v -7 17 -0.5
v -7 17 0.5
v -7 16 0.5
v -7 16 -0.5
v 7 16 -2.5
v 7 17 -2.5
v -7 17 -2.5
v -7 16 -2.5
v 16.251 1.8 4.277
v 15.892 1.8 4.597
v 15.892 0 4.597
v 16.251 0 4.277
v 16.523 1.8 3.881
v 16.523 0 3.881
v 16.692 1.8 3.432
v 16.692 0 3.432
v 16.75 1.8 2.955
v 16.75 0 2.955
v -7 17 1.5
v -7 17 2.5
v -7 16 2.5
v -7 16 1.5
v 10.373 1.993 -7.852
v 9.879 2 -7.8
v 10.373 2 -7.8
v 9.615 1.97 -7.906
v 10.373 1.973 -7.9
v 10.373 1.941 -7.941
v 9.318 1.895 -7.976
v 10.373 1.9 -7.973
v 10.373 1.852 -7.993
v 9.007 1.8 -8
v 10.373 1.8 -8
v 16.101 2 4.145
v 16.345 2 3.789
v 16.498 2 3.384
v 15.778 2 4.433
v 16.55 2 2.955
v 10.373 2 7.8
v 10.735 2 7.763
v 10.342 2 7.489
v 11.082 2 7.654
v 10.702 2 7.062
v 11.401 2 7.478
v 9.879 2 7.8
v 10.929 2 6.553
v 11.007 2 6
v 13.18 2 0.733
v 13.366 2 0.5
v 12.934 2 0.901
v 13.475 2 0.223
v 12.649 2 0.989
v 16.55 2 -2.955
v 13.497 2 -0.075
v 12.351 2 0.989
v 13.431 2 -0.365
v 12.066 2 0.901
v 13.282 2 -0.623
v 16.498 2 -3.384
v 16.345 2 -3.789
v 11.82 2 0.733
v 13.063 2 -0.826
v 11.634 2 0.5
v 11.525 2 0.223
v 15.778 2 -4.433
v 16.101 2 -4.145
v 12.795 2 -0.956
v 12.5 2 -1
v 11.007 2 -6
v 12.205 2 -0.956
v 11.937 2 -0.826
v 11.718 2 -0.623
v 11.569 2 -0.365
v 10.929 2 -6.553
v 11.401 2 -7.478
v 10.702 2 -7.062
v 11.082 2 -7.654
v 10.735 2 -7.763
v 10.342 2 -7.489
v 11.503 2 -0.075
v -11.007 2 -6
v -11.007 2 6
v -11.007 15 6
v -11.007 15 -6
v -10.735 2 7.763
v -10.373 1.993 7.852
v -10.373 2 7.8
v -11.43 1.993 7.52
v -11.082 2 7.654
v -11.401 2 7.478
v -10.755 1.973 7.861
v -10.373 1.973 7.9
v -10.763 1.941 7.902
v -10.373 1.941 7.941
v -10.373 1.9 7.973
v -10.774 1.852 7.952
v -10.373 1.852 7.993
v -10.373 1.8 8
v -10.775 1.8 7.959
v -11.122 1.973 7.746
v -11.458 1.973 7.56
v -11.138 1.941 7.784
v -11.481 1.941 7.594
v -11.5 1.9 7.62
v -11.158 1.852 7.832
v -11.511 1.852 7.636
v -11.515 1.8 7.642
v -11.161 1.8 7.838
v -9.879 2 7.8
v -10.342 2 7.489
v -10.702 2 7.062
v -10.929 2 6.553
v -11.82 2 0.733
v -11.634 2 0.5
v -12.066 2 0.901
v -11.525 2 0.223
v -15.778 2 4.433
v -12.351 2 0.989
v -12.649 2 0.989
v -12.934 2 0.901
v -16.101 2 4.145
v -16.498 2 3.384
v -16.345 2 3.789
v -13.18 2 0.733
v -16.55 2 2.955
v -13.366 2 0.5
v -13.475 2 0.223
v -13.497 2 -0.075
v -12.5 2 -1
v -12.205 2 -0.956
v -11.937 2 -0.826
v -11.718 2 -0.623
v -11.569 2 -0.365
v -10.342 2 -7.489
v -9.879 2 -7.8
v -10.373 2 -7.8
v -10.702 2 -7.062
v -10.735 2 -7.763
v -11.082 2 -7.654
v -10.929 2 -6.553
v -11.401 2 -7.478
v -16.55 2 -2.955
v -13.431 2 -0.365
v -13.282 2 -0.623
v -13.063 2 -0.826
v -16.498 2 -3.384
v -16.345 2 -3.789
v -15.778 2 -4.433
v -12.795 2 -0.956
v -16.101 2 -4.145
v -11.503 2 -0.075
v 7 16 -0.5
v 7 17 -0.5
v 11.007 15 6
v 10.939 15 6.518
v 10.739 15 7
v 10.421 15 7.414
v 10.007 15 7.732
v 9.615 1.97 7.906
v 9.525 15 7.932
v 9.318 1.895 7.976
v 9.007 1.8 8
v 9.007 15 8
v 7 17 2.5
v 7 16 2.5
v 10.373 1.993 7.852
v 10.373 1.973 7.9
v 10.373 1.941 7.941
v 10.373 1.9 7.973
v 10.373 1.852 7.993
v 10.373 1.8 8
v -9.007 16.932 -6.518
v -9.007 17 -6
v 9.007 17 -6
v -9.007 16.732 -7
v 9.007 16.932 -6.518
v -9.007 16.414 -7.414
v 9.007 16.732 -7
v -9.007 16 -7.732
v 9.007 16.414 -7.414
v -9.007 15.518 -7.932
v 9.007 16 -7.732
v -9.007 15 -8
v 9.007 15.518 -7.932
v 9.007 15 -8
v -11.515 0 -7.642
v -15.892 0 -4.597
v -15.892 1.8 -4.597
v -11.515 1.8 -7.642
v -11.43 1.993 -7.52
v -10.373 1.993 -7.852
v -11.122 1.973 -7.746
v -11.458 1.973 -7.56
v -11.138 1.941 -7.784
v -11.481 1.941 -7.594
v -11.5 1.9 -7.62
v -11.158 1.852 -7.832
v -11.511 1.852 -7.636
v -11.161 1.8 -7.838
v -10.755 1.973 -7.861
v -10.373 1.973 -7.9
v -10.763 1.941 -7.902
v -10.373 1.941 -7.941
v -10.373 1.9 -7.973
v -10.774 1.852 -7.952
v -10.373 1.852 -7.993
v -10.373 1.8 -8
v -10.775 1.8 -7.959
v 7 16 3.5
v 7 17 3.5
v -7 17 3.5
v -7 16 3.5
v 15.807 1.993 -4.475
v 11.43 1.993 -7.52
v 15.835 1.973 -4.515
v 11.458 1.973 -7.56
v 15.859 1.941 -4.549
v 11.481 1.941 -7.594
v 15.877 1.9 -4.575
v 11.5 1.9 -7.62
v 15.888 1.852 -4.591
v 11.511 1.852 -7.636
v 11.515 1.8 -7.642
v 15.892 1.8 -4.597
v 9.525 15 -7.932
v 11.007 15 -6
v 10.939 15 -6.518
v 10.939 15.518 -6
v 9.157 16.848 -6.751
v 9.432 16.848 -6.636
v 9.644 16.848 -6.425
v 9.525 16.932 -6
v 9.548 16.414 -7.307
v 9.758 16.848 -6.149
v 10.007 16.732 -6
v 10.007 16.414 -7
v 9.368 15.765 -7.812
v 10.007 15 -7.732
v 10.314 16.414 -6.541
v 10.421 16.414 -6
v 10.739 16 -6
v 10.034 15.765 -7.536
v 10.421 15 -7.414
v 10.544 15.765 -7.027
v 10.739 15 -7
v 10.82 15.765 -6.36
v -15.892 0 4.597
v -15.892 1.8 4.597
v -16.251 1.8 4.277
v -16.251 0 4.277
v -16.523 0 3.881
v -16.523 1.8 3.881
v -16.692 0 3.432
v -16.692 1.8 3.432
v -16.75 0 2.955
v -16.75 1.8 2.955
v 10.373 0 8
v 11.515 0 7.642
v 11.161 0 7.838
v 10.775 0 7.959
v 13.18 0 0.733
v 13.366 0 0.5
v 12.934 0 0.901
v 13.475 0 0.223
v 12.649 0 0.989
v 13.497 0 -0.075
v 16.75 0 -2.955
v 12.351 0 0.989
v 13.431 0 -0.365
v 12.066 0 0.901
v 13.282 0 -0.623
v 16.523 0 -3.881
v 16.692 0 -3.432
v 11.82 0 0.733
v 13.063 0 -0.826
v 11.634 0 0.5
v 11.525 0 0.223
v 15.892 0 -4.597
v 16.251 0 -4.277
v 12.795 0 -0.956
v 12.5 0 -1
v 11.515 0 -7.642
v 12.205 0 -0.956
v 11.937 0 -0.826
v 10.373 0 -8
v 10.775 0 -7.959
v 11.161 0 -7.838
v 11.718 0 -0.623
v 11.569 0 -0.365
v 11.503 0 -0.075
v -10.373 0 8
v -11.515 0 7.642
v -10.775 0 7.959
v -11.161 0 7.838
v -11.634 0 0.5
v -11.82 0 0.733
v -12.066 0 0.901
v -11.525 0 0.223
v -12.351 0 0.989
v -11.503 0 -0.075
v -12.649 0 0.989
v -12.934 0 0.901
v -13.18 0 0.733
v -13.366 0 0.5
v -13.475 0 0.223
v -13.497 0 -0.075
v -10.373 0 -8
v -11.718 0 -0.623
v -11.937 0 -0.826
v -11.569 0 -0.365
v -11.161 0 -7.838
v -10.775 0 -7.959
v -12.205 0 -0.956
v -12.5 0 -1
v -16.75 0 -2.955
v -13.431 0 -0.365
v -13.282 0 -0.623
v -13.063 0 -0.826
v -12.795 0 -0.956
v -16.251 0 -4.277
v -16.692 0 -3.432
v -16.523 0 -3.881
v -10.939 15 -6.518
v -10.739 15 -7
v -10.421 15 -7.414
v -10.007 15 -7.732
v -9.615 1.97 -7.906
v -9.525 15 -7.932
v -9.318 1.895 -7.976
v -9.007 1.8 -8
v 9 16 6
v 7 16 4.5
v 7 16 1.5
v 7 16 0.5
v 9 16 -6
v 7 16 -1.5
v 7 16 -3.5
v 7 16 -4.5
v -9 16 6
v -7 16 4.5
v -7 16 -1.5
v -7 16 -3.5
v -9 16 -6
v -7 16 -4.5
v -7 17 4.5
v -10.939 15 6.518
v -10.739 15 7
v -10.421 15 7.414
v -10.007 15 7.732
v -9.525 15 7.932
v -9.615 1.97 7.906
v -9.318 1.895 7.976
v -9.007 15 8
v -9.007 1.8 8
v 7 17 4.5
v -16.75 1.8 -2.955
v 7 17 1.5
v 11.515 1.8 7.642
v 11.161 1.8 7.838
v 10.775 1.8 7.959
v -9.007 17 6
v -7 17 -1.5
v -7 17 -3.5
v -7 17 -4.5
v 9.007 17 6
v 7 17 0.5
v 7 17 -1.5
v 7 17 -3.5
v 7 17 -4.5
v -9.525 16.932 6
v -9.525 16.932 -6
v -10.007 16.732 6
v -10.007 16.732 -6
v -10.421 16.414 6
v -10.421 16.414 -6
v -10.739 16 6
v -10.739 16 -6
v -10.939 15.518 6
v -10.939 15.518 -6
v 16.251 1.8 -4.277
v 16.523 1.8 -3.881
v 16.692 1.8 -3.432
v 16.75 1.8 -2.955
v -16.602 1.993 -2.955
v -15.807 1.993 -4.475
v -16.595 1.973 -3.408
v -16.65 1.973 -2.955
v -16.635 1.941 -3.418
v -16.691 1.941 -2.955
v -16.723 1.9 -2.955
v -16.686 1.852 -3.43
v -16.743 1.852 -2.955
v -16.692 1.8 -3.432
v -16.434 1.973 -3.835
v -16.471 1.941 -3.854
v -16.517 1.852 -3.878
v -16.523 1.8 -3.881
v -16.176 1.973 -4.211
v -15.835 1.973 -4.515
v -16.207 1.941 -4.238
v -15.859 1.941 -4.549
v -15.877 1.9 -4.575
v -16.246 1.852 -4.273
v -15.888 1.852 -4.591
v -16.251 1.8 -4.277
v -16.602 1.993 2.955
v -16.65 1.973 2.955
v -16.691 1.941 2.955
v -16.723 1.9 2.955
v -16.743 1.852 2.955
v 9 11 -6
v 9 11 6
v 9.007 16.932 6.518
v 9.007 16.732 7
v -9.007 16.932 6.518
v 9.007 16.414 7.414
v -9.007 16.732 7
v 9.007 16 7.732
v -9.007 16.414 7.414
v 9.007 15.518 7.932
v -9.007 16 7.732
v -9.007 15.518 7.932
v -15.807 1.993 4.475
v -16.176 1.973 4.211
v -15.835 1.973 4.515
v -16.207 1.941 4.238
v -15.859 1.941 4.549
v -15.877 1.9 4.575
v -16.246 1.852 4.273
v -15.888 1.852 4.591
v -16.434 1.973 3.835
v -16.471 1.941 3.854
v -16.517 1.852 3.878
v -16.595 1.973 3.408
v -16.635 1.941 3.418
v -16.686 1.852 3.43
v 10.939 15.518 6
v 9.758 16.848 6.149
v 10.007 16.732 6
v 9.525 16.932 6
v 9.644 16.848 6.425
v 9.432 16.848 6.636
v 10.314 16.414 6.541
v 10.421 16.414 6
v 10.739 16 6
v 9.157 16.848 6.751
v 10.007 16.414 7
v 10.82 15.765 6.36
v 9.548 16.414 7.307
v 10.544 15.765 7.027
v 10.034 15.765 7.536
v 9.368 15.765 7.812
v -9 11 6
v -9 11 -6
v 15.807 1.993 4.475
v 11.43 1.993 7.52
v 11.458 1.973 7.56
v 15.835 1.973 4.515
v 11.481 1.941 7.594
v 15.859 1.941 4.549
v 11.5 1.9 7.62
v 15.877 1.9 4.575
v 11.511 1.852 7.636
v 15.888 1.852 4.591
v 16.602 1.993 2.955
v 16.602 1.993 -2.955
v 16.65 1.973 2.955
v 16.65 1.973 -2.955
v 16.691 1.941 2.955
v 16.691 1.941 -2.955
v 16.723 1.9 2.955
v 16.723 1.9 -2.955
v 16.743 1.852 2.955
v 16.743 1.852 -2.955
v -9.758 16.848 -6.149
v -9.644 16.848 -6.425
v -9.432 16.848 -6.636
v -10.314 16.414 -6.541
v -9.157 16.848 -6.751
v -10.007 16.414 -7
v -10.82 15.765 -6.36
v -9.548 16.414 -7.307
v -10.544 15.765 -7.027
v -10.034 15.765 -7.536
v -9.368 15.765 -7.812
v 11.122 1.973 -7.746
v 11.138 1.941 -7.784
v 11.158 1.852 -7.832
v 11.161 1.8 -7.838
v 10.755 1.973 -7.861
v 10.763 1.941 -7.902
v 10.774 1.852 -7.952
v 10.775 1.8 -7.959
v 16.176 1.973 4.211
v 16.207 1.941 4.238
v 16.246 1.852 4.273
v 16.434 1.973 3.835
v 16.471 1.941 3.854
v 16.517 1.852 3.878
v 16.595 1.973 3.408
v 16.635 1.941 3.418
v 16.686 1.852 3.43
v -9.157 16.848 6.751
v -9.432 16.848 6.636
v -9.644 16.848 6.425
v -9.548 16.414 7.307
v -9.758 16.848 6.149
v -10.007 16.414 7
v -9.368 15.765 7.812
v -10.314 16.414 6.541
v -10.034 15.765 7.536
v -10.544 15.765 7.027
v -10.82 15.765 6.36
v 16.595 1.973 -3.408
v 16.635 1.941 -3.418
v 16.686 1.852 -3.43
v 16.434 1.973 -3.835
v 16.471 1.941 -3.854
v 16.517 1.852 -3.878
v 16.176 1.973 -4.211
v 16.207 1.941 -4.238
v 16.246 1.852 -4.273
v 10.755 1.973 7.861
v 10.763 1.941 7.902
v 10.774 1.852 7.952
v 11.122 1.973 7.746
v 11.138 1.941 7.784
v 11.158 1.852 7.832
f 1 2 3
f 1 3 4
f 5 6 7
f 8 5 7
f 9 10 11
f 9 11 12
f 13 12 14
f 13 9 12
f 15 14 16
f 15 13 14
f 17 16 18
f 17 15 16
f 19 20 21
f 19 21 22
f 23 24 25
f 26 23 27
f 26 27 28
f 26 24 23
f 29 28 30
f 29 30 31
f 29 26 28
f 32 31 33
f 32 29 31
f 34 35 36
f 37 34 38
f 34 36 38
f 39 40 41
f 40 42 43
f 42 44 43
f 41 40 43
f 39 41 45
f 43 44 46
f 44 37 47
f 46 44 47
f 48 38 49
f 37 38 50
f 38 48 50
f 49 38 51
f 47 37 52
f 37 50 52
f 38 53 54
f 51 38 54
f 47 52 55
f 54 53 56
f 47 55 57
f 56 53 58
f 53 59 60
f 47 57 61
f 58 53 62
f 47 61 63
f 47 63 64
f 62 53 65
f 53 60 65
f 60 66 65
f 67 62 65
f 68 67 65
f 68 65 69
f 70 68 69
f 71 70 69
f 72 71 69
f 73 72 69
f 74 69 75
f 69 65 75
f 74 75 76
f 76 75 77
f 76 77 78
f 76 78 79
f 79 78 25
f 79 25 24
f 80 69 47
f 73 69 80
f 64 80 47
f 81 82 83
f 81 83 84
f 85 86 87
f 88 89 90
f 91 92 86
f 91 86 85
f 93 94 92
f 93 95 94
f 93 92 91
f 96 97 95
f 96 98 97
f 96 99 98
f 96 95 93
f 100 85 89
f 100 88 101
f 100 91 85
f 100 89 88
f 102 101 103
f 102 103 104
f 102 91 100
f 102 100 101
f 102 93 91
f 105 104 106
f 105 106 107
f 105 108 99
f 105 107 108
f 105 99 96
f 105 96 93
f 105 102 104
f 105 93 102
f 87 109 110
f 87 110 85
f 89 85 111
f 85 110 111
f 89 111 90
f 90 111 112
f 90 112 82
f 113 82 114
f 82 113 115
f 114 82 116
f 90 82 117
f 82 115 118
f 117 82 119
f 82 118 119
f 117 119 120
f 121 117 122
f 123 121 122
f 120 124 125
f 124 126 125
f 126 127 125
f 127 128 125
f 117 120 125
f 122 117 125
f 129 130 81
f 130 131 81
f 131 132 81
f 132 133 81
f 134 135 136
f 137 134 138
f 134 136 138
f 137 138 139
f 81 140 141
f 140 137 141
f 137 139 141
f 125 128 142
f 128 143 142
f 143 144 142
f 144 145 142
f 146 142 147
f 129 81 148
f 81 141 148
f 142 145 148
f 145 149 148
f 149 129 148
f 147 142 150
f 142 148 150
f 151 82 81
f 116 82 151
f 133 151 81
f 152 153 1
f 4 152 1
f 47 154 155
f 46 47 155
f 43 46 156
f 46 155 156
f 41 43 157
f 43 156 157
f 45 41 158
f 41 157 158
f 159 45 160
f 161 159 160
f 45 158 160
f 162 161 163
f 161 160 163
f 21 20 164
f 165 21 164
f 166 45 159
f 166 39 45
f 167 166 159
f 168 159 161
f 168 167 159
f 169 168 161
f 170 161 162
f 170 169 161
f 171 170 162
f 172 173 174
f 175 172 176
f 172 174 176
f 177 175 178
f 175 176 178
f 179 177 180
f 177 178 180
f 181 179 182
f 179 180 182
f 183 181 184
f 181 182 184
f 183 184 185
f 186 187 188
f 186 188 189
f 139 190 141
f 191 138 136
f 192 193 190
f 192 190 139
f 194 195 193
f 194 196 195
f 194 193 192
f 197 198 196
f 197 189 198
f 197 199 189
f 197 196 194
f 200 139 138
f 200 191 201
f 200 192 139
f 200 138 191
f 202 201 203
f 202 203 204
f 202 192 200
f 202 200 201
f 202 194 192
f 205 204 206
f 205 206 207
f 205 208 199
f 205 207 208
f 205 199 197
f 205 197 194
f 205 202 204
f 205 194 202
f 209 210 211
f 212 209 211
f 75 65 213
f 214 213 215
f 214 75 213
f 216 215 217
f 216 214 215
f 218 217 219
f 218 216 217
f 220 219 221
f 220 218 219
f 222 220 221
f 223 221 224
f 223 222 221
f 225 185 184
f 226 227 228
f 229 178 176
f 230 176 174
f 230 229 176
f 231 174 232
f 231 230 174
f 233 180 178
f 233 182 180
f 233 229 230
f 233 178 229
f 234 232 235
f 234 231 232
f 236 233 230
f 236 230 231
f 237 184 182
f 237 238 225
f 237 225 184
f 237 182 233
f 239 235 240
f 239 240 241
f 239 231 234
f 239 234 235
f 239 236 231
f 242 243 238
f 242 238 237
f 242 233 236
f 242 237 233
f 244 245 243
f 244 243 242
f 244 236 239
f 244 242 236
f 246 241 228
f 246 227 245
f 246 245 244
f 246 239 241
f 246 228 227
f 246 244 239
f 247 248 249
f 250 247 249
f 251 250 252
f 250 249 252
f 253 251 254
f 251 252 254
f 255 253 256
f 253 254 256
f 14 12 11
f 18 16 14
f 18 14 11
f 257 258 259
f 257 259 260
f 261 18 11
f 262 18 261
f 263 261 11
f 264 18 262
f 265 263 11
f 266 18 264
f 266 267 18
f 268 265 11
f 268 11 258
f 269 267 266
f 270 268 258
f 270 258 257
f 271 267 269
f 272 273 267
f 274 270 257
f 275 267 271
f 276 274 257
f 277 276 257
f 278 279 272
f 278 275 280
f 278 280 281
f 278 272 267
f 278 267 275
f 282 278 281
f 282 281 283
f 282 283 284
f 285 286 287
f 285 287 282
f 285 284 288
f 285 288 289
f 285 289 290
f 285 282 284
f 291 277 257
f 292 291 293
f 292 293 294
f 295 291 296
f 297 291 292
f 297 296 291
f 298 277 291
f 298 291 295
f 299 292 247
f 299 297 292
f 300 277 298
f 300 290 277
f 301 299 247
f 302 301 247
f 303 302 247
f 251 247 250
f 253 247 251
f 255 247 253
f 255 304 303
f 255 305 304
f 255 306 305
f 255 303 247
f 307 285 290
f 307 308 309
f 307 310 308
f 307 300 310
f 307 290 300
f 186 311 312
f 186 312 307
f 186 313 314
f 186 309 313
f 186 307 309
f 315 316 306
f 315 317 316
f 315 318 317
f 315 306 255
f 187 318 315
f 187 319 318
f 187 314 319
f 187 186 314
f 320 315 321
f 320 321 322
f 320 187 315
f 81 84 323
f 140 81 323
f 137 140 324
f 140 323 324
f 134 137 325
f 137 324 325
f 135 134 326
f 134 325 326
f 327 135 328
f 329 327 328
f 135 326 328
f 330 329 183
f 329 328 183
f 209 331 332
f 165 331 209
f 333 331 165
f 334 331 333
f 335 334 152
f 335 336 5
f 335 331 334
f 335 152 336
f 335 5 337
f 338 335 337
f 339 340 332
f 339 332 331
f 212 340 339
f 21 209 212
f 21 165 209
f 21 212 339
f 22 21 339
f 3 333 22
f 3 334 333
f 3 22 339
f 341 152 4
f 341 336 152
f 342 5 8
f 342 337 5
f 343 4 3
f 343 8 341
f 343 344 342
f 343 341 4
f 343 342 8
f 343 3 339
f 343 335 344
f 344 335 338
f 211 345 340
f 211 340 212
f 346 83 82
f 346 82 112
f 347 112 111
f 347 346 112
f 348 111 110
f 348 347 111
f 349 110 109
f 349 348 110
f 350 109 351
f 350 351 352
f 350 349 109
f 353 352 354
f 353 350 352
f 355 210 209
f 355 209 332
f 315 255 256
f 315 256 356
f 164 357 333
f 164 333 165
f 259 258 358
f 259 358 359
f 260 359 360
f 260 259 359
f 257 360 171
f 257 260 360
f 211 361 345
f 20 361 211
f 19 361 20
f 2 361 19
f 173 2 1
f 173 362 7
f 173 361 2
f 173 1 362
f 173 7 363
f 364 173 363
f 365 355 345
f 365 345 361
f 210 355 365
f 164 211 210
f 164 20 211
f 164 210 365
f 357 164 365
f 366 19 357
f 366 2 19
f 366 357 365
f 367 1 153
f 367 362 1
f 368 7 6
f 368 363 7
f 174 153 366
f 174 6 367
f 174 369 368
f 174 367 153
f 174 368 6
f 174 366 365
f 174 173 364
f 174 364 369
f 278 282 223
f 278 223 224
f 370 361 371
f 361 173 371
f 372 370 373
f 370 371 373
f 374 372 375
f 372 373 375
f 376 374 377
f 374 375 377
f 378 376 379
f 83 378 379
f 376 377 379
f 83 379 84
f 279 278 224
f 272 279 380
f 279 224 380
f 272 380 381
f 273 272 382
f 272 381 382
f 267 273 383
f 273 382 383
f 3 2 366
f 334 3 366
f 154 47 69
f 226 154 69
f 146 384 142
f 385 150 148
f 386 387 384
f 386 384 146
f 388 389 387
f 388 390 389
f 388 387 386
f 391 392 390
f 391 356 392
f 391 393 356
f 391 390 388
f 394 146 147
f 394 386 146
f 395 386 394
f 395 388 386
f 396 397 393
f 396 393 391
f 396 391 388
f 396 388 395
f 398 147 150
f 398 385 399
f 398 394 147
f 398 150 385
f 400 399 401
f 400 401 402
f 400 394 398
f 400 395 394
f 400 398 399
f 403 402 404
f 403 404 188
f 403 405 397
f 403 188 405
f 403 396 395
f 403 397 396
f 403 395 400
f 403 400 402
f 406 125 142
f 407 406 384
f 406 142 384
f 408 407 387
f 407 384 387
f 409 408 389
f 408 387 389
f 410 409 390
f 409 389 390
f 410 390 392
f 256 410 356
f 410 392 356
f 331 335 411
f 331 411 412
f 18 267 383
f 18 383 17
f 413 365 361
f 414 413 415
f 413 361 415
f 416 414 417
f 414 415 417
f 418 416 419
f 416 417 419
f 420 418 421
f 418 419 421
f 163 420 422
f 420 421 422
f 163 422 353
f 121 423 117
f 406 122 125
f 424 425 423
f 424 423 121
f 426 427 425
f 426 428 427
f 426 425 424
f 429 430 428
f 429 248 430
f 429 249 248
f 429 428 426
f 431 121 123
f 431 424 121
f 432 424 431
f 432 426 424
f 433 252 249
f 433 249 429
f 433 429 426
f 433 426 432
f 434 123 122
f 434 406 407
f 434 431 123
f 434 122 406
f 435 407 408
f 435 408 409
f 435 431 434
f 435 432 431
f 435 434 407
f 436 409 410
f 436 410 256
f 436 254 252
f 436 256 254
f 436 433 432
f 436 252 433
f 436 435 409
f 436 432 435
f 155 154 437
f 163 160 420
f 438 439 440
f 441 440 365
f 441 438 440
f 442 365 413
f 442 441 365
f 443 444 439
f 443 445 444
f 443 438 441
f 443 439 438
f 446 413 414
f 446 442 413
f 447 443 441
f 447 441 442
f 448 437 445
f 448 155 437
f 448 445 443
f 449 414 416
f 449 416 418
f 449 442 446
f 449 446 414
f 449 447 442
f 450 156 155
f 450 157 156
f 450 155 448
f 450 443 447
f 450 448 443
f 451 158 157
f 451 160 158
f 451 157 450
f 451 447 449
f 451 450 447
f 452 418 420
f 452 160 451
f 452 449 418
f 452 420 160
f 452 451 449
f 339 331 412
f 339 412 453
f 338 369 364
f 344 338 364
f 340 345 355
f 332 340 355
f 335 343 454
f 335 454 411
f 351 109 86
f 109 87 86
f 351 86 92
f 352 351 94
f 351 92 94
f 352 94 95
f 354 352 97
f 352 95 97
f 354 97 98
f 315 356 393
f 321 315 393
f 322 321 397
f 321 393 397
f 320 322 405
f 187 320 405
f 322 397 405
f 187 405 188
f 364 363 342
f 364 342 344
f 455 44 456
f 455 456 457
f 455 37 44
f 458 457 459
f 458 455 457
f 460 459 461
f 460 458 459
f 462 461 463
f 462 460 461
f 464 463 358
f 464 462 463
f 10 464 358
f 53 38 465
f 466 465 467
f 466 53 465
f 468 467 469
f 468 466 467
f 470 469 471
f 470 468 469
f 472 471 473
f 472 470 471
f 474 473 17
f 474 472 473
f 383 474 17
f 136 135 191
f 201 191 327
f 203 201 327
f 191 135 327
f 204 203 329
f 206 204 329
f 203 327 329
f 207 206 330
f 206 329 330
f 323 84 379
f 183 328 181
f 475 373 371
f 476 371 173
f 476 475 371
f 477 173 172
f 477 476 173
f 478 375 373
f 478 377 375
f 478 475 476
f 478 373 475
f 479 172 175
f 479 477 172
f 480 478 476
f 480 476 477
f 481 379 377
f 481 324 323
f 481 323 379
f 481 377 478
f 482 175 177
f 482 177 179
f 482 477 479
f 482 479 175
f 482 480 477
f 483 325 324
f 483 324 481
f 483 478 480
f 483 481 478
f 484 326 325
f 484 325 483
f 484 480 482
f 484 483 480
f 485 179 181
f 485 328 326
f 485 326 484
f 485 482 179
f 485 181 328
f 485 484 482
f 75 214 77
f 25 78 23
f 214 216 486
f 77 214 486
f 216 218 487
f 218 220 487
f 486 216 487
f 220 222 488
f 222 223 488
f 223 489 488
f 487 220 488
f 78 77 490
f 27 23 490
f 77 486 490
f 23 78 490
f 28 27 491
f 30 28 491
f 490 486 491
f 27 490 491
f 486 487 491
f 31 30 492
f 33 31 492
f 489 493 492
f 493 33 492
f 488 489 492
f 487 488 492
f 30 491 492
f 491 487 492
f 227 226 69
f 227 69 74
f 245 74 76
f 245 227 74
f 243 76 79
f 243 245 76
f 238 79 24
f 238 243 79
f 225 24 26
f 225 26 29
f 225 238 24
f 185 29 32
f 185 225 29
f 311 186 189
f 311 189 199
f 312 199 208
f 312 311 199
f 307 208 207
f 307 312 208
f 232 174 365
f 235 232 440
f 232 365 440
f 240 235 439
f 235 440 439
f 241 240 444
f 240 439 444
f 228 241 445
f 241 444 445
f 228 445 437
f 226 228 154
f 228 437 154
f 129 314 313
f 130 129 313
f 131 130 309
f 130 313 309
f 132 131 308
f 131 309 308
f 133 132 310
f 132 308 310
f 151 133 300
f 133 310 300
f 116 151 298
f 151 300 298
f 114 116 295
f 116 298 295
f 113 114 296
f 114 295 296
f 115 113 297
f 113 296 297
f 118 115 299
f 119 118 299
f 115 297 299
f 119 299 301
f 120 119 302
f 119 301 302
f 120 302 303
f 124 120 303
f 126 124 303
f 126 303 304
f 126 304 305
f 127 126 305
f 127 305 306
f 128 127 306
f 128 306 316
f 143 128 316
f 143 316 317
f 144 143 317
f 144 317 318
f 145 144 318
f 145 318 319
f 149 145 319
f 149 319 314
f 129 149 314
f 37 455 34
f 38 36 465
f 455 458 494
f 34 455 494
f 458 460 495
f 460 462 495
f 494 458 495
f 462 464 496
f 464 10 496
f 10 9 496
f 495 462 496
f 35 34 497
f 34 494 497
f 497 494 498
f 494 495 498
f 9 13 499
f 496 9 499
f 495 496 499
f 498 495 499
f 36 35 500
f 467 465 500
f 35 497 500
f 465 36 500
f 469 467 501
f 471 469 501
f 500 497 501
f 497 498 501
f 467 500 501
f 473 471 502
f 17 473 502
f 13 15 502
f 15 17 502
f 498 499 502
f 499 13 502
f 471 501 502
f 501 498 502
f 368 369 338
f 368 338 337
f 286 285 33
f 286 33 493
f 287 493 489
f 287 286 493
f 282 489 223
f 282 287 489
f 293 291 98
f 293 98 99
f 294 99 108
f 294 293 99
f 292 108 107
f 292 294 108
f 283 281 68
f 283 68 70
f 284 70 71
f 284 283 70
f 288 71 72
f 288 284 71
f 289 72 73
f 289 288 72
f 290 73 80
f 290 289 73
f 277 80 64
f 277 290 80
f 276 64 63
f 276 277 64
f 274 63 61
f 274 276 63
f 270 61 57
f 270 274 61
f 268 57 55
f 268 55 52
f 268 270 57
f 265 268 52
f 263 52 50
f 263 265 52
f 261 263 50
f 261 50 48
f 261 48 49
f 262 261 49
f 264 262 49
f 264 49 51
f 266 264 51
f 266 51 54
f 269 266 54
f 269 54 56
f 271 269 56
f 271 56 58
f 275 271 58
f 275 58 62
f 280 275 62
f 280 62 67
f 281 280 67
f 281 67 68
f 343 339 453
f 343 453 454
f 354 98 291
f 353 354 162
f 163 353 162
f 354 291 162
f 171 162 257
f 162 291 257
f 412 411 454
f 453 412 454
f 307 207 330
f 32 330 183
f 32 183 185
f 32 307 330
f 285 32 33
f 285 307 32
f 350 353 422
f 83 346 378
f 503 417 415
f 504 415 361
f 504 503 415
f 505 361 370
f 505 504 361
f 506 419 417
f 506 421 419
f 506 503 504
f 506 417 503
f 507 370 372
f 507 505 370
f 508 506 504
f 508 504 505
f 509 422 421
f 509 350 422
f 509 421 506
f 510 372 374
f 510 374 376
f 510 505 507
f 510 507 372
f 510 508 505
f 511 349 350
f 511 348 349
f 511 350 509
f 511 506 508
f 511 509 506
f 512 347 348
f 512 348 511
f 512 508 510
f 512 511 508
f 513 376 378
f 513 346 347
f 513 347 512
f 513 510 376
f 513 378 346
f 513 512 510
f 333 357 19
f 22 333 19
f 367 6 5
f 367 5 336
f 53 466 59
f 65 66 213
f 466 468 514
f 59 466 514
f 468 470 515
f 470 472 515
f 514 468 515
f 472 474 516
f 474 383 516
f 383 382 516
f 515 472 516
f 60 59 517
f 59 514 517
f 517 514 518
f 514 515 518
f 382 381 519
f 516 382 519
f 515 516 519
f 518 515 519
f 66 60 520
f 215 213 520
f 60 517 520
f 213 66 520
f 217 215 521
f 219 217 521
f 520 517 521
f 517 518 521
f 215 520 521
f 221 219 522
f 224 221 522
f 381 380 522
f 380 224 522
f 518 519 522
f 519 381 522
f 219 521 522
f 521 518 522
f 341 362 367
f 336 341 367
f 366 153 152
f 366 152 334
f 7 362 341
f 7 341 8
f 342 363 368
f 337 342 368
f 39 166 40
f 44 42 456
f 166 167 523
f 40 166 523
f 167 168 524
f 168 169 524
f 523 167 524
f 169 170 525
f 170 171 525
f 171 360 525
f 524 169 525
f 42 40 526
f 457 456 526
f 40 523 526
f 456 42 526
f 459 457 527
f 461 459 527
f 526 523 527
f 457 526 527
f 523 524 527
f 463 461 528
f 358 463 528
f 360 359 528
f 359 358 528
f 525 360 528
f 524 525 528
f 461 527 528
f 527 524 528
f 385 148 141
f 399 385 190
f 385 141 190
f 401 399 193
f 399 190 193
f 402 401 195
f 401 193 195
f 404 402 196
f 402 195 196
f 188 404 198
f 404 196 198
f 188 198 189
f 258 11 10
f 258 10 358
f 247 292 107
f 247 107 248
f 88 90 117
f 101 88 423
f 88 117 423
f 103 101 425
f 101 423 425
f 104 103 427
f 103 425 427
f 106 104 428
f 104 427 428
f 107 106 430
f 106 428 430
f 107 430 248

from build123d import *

# Parameters (mm, degrees)
EXTRUDE_1_DEPTH            = 2
SKETCH_2_W                 = 22.014506199136
SKETCH_2_H                 = 16
EXTRUDE_2_DEPTH            = 15
CUT_EXTRUDE_1_REACH        = 27.171
SKETCH_3_R                 = 1.0000000000000016
CUT_EXTRUDE_2_DEPTH        = 1
PATTERN_LINEAR_1_COUNT     = 3
PATTERN_LINEAR_1_PITCH     = 2
PATTERN_LINEAR_1_COL_COUNT = 3
PATTERN_LINEAR_1_COL_PITCH = 2
CUT_EXTRUDE_3_DEPTH        = 5
FILLET_4_R                 = 2
CUT_EXTRUDE_5_DEPTH        = 15
MIRROR_3_COPY_1_DEPTH      = 15
FILLET_6_R                 = 0.2
FILLET_7_R                 = 2


with BuildPart() as part:
    # 草图1 → 凸台-拉伸1 (new body)
    with BuildSketch(Plane(origin=(0, 0, 0), x_dir=(1, 0, 0), z_dir=(0, 1, 0))):
        with BuildLine():
            Line((-16.75, -4.000000000000002), (-16.75, 3.9999999999999982))
            Line((-16.75, 3.9999999999999982), (-11.51489754486675, 7.641810403570972))
            ThreePointArc((-11.51489754486675, 7.641810403570972), (-10.971257997306036, 7.908352798507383), (-10.372768568469548, 7.9999999999999964))
            Line((-10.372768568469548, 7.9999999999999964), (10.372768568469544, 8))
            ThreePointArc((10.372768568469544, 8), (10.971257997306031, 7.908352798507387), (11.514897544866734, 7.641810403570965))
            Line((11.514897544866734, 7.641810403570965), (16.75, 4.000000000000005))
            Line((16.75, 4.000000000000005), (16.75, -3.9999999999999947))
            Line((16.75, -3.9999999999999947), (11.514897544866738, -7.641810403570964))
            ThreePointArc((11.514897544866738, -7.641810403570964), (10.971257997306049, -7.908352798507378), (10.37276856846958, -7.9999999999999964))
            Line((10.37276856846958, -7.9999999999999964), (-10.372768568469548, -7.999999999999998))
            ThreePointArc((-10.372768568469548, -7.999999999999998), (-10.971257997306035, -7.908352798507385), (-11.51489754486674, -7.641810403570962))
            Line((-11.51489754486674, -7.641810403570962), (-16.75, -4.000000000000002))
        make_face()
    extrude(amount=EXTRUDE_1_DEPTH)

    # 草图2 → 凸台-拉伸2 (add)
    with BuildSketch(Plane(origin=(0, 2, 0), x_dir=(1, 0, 0), z_dir=(0, 1, 0))):
        Rectangle(SKETCH_2_W, SKETCH_2_H)
    extrude(amount=EXTRUDE_2_DEPTH)

    # 草图3 → 切除-拉伸1 (cut, up to next)
    with BuildSketch(Plane.XZ, mode=Mode.PRIVATE) as cut_extrude_1_sk1:
        with Locations(Location((-12.5, -1.53e-15, 0), (0, 0, 270))):
            Circle(SKETCH_3_R)
    cut_extrude_1_tool1 = extrude(cut_extrude_1_sk1.sketch, amount=-CUT_EXTRUDE_1_REACH, mode=Mode.PRIVATE) & part.part
    cut_extrude_1 = cut_extrude_1_tool1.solids().sort_by_distance((-12.5, 0, 0))[0]
    add(cut_extrude_1, mode=Mode.SUBTRACT)

    # 镜向1: 切除-拉伸1 across plane
    add(cut_extrude_1.mirror(Plane(origin=(0, 0, 0), x_dir=(0, 0, 1), z_dir=(1, 0, 0))), mode=Mode.SUBTRACT)

    # 草图4 → 切除-拉伸2 (cut)
    with BuildSketch(Plane(origin=(0, 17, 0), x_dir=(1, 0, 0), z_dir=(0, 1, 0))):
        Polygon((0, 0.5), (7, 0.5), (7, -0.5), (0, -0.5), (-7, -0.5), (-7, 0.5), align=None)
    cut_extrude_2 = extrude(amount=-CUT_EXTRUDE_2_DEPTH, mode=Mode.SUBTRACT)

    # 阵列(线性)1: 切除-拉伸2 ×3
    with Locations(*[(0, 0, i * PATTERN_LINEAR_1_PITCH) for i in range(1, PATTERN_LINEAR_1_COUNT)]):
        add(cut_extrude_2, mode=Mode.SUBTRACT)

    # 阵列(线性)1 col: 切除-拉伸2 ×3
    with Locations(*[(0, 0, -i * PATTERN_LINEAR_1_COL_PITCH) for i in range(1, PATTERN_LINEAR_1_COL_COUNT)]):
        add(cut_extrude_2, mode=Mode.SUBTRACT)

    # 草图5 → 切除-拉伸3 (cut)
    with BuildSketch(Plane(origin=(0, 16, 0), x_dir=(1, 0, 0), z_dir=(0, 1, 0))):
        Polygon((9, 6.0000000000000036), (9.000000000000002, -5.999999999999997), (-8.999999999999998, -6.000000000000001), (-8.999999999999998, 5.999999999999999), align=None)
    extrude(amount=-CUT_EXTRUDE_3_DEPTH, mode=Mode.SUBTRACT)

    # 圆角4
    fillet_4_edges = [part.edges().sort_by_distance(p)[0] for p in [
        (-16.75, 1, 4.000000000000002),
        (-16.75, 1, -3.9999999999999982),
        (16.75, 1, -4.000000000000005),
        (16.75, 1, 3.9999999999999947),
    ]]
    fillet(fillet_4_edges, radius=FILLET_4_R)

    # 草图8 → 切除-拉伸5 (cut)
    with BuildSketch(Plane(origin=(0, 17, 0), x_dir=(1, 0, 0), z_dir=(0, 1, 0))):
        with BuildLine():
            Line((-9.007253099567999, 8), (-11.007253099568, 8))
            Line((-11.007253099568, 8), (-11.007253099568, 6))
            ThreePointArc((-11.007253099568, 6), (-10.421466661941093, 7.414213562373095), (-9.007253099567999, 8))
        make_face()
    cut_extrude_5 = extrude(amount=-CUT_EXTRUDE_5_DEPTH, mode=Mode.SUBTRACT)

    # 镜向2: 切除-拉伸5 across plane
    add(cut_extrude_5.mirror(Plane(origin=(0, 0, 0), x_dir=(0, 0, 1), z_dir=(1, 0, 0))), mode=Mode.SUBTRACT)

    # 镜向3: 切除-拉伸5 across plane
    add(cut_extrude_5.mirror(Plane.XY), mode=Mode.SUBTRACT)

    # 镜向3 copy 1 sketch → 镜向3 copy 1 (cut)
    with BuildSketch(Plane(origin=(0, 17, 0), x_dir=(-1, 0, 0), z_dir=(0, 1, 0))):
        with BuildLine():
            Line((-9.007253099567999, 8), (-11.007253099568, 8))
            Line((-11.007253099568, 8), (-11.007253099568, 6))
            ThreePointArc((-11.007253099568, 6), (-10.421466661941093, 7.414213562373095), (-9.007253099567999, 8))
        make_face()
    extrude(amount=-MIRROR_3_COPY_1_DEPTH, mode=Mode.SUBTRACT)

    # 圆角6
    fillet_6_edges = [part.edges().sort_by_distance(p)[0] for p in [
        (10.971257997306049, 2, 7.908352798507378),
        (13.703513260631969, 2, 6.119295123038627),
        (-16.75, 2, -8.9e-16),
        (-13.70351326063197, 2, 6.119295123038629),
        (-16.522605138319644, 2, 3.881182710057475),
        (-16.522605138319644, 2, -3.881182710057476),
        (13.703513260631965, 2, -6.119295123038633),
        (16.75, 2, -3.55e-15),
        (16.522605138319644, 2, 3.8811827100574723),
        (16.52260513831964, 2, -3.8811827100574794),
        (-9.690010834018773, 2, -8),
        (9.690010834018771, 2, -8),
        (-9.690010834018773, 2, 8),
        (9.69001083401879, 2, 8),
        (10.97125799730603, 2, -7.908352798507387),
        (-10.971257997306036, 2, -7.908352798507383),
        (-13.703513260631976, 2, -6.119295123038633),
        (-10.971257997306035, 2, 7.908352798507385),
    ]]
    fillet(fillet_6_edges, radius=FILLET_6_R)

    # 圆角7
    fillet_7_edges = [part.edges().sort_by_distance(p)[0] for p in [
        (-11.007253099568, 17, 0),
        (-10.421466661941095, 17, -7.414213562373094),
        (1.78e-15, 17, -8),
        (10.421466661941095, 17, -7.414213562373094),
        (-1.78e-15, 17, 8),
        (-10.421466661941095, 17, 7.414213562373094),
        (11.007253099568, 17, 0),
        (10.421466661941095, 17, 7.414213562373094),
    ]]
    fillet(fillet_7_edges, radius=FILLET_7_R)


solid = part.part
